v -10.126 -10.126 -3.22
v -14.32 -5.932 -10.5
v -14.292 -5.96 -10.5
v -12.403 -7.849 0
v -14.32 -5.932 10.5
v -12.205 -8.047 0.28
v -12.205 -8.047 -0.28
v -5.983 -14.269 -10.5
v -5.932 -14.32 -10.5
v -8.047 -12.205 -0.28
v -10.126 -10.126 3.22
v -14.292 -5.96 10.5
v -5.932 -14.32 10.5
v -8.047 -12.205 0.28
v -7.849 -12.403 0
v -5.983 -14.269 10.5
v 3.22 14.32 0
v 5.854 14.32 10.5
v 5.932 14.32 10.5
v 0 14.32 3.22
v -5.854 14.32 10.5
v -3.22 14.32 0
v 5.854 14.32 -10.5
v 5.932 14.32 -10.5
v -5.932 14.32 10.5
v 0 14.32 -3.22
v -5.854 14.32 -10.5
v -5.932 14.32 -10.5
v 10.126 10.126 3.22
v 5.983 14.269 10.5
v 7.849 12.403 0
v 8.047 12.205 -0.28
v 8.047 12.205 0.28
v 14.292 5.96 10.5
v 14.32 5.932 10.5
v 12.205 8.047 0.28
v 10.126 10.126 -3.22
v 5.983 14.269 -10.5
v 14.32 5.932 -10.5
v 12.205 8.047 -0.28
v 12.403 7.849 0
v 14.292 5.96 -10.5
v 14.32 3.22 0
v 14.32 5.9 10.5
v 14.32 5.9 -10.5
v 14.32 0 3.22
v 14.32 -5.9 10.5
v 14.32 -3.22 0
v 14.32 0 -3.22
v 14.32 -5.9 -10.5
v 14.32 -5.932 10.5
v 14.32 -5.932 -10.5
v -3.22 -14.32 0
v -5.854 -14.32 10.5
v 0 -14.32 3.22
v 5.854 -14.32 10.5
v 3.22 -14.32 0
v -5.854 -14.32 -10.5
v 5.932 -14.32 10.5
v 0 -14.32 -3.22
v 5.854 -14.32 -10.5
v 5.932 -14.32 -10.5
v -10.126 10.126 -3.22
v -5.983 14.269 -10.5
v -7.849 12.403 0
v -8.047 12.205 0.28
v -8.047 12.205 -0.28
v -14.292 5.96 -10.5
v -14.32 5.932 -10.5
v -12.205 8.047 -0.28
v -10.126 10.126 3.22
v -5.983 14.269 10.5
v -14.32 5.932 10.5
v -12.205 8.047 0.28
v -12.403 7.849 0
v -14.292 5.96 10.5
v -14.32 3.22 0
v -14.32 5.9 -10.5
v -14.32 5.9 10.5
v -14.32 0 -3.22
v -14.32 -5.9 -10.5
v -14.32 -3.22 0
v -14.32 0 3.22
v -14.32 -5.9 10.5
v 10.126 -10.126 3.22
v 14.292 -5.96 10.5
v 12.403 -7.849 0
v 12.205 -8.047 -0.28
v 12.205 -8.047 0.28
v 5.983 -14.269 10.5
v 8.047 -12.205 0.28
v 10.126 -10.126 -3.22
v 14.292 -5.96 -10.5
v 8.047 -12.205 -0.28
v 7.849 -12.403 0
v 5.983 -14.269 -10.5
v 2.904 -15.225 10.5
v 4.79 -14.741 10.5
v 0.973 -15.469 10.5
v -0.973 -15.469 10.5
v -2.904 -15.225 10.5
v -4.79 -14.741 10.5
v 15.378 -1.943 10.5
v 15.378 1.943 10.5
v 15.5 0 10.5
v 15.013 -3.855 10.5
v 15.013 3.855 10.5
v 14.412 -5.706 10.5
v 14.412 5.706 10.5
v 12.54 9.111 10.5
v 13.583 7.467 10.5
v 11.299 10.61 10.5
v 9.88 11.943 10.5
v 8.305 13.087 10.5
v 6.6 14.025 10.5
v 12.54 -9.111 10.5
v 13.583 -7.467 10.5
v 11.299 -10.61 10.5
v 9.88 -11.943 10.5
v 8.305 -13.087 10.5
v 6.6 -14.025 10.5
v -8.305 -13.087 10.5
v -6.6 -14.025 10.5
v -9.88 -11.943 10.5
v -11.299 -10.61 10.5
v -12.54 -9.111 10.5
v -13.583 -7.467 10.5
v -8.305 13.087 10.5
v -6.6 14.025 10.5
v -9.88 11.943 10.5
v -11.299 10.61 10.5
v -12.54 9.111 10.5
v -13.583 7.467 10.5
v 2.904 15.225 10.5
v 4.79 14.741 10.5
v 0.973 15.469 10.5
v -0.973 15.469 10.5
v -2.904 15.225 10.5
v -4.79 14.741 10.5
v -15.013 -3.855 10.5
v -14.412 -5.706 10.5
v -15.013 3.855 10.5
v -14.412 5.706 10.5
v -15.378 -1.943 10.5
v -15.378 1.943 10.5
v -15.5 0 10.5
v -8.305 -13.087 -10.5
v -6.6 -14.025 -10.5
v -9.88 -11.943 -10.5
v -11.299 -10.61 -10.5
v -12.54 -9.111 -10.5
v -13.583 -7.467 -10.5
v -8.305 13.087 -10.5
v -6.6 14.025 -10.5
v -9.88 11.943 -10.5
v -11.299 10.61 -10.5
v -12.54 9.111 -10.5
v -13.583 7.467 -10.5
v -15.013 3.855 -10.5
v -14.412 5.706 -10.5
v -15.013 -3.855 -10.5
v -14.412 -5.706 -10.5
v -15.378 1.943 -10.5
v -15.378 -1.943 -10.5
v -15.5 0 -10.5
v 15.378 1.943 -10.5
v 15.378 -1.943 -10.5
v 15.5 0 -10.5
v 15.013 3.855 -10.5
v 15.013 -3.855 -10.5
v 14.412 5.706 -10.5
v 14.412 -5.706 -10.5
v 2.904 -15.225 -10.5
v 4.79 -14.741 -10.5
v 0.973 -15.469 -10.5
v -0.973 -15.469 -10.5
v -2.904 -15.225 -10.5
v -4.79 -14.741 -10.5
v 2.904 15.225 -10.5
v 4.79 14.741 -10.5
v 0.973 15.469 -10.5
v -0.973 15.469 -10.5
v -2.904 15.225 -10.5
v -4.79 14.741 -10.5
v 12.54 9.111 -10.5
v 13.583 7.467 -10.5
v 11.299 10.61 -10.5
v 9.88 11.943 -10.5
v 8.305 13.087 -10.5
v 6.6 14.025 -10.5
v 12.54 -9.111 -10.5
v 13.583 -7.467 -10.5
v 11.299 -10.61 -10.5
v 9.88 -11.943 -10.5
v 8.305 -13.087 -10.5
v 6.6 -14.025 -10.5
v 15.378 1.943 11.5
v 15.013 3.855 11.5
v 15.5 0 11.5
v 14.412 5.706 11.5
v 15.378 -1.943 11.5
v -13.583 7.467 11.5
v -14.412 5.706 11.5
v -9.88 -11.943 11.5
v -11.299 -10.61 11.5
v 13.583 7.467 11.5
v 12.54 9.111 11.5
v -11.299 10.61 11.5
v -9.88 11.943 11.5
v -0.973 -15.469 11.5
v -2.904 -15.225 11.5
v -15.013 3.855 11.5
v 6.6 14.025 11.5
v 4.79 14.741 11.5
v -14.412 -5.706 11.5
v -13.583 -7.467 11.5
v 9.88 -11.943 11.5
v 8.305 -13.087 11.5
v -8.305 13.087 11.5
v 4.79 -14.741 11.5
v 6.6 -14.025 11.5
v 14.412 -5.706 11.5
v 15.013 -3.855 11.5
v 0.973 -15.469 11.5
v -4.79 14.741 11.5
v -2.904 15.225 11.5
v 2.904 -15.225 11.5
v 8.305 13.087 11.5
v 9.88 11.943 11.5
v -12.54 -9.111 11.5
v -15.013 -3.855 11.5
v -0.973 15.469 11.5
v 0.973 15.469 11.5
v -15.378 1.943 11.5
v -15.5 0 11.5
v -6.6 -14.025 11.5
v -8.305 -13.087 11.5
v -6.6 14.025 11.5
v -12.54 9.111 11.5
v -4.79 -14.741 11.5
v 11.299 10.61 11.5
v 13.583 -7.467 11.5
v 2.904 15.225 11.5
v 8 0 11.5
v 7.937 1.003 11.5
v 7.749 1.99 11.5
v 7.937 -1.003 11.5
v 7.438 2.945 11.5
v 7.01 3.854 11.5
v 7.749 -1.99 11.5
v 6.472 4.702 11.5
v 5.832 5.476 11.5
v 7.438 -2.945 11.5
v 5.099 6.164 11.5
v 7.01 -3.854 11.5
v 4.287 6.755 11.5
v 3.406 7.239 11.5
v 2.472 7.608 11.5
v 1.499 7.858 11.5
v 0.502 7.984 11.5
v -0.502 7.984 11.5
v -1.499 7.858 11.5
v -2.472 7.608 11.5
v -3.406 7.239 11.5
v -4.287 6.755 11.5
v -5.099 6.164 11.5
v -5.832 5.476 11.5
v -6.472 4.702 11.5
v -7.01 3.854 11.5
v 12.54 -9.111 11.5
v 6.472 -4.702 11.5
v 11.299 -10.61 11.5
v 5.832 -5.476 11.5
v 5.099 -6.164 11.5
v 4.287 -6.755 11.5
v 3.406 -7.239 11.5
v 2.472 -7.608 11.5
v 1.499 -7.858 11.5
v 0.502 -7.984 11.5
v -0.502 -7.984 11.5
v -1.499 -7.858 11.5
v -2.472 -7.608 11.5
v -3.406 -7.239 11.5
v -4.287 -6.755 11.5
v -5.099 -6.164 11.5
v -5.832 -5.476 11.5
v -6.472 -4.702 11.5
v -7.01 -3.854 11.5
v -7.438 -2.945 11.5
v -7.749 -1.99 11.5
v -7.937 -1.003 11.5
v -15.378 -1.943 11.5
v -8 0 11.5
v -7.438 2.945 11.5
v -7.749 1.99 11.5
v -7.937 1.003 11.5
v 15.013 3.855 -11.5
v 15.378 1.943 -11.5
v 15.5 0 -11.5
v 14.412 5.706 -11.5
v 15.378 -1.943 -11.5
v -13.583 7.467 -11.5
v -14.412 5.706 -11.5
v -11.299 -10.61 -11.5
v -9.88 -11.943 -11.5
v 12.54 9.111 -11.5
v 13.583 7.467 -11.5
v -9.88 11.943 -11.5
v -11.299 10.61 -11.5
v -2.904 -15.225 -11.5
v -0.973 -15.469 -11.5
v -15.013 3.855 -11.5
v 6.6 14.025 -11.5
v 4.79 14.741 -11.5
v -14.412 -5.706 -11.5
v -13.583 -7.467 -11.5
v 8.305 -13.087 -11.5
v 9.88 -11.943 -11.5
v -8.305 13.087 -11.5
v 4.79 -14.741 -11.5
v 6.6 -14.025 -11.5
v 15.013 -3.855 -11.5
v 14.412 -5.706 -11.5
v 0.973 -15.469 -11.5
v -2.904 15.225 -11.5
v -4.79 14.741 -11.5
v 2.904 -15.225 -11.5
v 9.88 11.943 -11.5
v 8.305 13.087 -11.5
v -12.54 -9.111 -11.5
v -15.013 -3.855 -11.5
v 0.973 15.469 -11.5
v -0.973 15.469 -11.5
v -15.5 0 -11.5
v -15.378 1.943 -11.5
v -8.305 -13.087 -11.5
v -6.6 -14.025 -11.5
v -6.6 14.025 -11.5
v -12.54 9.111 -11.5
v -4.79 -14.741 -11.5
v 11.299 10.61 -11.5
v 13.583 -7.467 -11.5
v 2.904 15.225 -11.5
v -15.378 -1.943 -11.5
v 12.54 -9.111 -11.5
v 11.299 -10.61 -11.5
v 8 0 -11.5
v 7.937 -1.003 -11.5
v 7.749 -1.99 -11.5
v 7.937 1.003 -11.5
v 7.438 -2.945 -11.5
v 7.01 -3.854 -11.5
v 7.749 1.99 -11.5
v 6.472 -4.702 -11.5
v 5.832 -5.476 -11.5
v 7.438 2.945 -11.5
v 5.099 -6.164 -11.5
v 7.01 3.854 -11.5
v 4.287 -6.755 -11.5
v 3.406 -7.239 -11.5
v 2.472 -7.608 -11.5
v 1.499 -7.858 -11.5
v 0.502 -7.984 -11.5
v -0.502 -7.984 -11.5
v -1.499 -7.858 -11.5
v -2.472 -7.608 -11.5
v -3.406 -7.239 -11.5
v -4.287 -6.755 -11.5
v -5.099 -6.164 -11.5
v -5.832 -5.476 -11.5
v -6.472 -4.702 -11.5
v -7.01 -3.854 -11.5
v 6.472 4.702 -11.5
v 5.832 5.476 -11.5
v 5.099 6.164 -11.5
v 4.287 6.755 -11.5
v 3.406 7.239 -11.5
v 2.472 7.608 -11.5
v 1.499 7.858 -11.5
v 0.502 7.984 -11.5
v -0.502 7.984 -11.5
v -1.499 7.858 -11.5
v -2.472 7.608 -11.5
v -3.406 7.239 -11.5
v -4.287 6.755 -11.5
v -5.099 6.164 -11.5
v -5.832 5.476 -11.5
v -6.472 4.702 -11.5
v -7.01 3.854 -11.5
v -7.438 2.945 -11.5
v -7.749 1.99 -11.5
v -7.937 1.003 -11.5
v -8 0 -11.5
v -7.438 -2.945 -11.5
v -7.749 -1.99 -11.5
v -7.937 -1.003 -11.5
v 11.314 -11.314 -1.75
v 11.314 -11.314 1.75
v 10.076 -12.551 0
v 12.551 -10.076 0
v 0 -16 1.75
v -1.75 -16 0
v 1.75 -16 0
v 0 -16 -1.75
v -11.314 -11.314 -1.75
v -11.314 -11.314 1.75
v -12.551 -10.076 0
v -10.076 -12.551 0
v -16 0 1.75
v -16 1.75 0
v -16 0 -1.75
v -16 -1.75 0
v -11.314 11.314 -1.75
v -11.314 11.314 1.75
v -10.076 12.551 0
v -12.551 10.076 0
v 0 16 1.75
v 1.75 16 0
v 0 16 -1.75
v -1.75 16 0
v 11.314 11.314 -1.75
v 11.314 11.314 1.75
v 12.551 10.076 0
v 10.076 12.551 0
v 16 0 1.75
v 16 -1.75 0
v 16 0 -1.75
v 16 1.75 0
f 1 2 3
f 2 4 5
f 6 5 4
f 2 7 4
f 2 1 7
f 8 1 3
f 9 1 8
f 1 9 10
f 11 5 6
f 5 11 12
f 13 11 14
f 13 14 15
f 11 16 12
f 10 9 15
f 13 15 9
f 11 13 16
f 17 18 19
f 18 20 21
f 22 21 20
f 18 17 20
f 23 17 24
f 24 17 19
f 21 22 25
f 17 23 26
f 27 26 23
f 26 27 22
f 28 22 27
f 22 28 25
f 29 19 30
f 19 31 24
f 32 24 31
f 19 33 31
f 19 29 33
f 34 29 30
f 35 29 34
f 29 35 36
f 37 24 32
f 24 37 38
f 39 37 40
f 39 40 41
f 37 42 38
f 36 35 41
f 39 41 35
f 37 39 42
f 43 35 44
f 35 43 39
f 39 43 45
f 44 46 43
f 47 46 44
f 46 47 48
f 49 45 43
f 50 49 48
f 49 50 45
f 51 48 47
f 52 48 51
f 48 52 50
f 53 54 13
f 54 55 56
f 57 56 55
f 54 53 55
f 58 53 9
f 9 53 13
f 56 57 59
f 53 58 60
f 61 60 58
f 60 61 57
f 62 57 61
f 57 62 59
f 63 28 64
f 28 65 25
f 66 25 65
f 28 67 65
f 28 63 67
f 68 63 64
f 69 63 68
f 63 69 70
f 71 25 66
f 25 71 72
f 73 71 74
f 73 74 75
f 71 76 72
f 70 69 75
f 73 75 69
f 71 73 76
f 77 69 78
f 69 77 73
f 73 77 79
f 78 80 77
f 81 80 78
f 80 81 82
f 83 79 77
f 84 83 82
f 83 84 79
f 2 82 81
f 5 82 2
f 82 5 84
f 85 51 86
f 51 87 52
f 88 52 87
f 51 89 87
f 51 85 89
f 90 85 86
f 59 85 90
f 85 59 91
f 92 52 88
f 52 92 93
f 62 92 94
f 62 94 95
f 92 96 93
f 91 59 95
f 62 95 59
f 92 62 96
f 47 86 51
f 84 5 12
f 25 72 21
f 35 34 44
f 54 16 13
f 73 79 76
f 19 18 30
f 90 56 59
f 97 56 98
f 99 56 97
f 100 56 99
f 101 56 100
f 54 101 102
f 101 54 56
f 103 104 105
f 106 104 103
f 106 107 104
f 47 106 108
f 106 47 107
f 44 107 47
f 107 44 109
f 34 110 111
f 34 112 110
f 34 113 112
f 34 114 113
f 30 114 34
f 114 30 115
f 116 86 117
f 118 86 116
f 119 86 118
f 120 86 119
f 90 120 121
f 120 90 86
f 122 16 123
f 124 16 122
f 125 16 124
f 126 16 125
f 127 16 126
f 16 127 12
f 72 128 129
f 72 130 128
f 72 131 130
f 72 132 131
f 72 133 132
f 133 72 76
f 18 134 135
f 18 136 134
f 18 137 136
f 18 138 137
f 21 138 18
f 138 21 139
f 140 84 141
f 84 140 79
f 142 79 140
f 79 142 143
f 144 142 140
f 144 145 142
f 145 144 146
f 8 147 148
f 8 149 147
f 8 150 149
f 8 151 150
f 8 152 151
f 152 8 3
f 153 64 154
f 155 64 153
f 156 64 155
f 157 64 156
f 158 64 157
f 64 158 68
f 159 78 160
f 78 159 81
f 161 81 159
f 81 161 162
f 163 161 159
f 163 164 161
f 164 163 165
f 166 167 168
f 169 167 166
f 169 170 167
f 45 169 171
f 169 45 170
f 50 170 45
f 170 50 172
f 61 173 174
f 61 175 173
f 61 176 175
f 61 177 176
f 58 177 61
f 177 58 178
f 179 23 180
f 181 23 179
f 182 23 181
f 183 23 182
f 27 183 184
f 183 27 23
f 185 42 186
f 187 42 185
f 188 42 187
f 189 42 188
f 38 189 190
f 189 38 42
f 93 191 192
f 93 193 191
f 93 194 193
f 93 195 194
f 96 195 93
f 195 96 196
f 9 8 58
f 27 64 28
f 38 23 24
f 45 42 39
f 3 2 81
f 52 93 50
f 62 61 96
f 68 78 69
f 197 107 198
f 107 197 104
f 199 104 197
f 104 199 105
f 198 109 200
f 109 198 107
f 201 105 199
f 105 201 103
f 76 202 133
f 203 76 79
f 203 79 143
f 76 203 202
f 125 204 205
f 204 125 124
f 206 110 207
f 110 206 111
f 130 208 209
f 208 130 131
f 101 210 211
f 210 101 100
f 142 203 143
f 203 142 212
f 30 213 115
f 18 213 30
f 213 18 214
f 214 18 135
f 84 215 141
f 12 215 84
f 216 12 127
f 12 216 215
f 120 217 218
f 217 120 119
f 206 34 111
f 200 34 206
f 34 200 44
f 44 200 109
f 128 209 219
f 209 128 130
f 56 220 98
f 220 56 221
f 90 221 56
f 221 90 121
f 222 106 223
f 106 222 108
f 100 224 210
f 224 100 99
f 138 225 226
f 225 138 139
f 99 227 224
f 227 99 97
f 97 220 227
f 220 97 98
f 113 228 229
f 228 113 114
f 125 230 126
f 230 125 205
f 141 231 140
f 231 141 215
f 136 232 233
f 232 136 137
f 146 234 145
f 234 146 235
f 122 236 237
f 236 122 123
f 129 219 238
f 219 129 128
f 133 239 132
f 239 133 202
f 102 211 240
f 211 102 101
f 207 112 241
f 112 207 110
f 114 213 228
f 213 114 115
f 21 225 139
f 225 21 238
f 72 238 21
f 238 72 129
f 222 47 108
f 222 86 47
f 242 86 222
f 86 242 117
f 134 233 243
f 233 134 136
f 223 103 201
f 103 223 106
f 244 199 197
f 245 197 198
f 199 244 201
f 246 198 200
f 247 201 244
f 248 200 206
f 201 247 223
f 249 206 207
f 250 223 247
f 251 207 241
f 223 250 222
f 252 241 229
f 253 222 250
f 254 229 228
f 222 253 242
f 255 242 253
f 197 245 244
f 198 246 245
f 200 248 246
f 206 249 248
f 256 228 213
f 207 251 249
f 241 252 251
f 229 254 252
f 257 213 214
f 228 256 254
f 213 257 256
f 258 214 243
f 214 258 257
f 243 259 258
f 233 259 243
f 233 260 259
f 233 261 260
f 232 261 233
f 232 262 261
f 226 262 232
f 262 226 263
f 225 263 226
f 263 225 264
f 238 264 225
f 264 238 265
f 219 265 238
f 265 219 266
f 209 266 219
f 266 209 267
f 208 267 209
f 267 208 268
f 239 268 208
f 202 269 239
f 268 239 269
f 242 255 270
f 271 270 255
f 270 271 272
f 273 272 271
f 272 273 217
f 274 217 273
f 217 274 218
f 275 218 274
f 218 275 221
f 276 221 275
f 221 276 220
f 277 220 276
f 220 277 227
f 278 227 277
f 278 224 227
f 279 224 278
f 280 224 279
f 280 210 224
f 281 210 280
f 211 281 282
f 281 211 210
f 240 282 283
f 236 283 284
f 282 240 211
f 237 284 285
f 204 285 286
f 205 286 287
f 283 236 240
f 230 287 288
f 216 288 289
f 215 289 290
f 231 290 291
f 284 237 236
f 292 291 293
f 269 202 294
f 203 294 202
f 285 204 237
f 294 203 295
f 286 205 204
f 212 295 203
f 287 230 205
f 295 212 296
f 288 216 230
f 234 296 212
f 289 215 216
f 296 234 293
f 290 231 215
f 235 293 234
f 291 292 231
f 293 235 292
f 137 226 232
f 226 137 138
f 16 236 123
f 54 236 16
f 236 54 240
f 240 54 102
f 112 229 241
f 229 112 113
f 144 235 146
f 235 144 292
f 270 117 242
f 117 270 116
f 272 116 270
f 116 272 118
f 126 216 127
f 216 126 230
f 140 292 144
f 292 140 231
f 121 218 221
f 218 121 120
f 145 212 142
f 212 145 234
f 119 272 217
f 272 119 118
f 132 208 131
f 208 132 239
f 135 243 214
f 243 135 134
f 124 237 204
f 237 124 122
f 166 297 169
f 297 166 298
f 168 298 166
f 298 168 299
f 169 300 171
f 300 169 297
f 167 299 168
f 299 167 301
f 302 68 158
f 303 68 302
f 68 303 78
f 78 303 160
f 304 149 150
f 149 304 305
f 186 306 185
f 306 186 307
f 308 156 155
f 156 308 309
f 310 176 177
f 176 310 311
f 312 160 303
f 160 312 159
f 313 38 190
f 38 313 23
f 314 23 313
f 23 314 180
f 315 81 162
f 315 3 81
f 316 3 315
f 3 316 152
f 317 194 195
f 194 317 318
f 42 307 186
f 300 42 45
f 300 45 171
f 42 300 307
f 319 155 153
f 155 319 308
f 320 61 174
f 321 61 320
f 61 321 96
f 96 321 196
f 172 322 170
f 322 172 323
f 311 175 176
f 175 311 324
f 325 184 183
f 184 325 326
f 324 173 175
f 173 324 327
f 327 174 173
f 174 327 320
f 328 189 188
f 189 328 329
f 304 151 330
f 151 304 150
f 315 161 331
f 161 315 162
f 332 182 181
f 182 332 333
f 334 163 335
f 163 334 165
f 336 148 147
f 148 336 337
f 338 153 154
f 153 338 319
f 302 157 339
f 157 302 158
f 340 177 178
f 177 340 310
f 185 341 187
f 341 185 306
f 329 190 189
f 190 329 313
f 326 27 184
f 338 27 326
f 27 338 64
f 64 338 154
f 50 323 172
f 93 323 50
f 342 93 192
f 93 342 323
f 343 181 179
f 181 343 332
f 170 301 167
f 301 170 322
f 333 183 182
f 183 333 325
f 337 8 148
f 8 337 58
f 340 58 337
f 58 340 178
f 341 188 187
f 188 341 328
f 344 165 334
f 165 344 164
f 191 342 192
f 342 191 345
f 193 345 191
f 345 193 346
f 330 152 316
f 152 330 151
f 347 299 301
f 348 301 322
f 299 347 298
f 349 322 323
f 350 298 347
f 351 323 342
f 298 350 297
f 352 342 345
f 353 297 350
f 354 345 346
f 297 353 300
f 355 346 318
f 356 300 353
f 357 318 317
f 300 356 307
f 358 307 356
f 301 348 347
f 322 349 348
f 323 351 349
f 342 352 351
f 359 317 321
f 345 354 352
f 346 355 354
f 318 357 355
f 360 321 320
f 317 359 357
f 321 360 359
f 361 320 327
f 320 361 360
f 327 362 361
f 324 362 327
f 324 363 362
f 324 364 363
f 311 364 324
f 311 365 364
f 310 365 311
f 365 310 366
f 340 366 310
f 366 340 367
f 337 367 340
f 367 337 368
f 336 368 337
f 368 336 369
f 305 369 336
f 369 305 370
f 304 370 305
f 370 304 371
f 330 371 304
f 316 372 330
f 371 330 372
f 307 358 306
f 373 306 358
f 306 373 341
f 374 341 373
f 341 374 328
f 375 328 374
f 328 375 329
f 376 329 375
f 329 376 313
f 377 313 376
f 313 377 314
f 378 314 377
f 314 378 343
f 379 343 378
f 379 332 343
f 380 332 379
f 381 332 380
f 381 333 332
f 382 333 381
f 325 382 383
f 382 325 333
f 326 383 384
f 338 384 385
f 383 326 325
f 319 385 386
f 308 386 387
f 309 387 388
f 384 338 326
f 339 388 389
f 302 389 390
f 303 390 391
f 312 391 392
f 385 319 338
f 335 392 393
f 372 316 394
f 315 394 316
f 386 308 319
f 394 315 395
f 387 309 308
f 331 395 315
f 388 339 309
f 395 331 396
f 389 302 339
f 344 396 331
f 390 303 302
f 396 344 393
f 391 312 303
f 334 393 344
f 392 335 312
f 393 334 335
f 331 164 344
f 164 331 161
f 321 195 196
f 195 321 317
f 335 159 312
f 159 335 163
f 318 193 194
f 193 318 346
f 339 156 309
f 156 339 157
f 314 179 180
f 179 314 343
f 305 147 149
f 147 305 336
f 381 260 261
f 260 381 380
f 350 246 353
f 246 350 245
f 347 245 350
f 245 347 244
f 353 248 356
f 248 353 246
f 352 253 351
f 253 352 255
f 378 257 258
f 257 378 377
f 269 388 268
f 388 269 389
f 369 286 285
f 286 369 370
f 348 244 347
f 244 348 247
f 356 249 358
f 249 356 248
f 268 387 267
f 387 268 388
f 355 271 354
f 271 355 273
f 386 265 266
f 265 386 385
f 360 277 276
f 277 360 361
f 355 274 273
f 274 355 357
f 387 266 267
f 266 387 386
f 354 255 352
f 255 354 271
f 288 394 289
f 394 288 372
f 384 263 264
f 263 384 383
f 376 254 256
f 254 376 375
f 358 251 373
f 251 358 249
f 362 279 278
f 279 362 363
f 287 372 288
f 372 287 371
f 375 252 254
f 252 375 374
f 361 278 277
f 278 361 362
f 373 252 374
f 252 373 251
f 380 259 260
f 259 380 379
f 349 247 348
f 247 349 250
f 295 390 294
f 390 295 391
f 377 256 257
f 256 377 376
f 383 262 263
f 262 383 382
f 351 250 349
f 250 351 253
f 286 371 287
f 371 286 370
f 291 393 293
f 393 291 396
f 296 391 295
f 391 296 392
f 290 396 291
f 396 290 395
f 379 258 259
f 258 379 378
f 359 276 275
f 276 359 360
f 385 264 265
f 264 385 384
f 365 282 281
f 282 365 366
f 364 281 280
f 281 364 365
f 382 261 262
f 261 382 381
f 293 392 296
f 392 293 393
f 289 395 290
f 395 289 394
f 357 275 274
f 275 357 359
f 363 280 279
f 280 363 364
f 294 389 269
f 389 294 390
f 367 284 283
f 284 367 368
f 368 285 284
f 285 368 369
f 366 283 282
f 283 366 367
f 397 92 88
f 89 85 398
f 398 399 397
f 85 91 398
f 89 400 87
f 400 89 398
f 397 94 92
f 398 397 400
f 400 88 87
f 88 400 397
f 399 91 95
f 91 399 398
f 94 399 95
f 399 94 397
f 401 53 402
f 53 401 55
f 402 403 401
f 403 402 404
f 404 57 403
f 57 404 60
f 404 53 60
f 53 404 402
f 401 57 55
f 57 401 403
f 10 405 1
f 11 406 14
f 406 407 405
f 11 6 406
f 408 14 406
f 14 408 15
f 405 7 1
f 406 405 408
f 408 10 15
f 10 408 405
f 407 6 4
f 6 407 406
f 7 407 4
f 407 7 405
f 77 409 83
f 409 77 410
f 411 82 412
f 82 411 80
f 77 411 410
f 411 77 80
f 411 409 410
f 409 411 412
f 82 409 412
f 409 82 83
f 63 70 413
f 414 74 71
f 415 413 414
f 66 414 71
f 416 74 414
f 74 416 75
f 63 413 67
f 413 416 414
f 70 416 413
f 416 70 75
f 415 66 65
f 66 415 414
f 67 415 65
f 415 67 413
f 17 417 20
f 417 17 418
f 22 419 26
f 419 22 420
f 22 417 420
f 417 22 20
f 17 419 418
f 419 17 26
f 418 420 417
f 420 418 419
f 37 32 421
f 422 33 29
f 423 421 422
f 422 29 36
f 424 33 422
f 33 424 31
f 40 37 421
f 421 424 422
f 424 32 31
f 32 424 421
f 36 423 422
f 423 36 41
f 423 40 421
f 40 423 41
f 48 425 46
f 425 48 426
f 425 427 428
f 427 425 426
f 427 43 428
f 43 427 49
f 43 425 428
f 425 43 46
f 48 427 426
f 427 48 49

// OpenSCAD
//use <use/openscad/shapes.scad>

$fn = 50;

//wheel_slave_original();
wheel_w = 21;
axle_d=16;
wheel_d = 31;
pyramid_h = 2;
rim_w = 1;

wheel();
module bearing(){
    color("yellow")
    cylinder(d=22, h=7);
}


module wheel(){
    
    //main wheel
    difference(){
        union(){
            rotate([0,0,022.5])
            cylinder(d=wheel_d, h=wheel_w, center=true, $fn = 8);
            //rims
            translate([0,0,wheel_w/2 + rim_w/2])
            cylinder(d=wheel_d, h = rim_w, center=true);
            translate([0,0,-wheel_w/2 +- rim_w/2])
            cylinder(d=wheel_d, h = rim_w, center=true);              
        }
        cylinder(d=axle_d,h=wheel_w + rim_w*2,center=true);
    }
  
    //tread
    pyramids();
}



module pyramids(){
    for (i = [1 : 8]){
        color("red")
        rotate([45*i,90,0])
        translate([0,0,wheel_w/2 + pyramid_h*1.75])    
        cylinder(d=7,d2=3.5,h=pyramid_h,$fn=4);
    }   
}
module wheel_slave_original(){
    translate([35,-10,2])
    rotate([0,0,0])
    color("green")
    import("import/slave_wheel_SL.stl");
}
